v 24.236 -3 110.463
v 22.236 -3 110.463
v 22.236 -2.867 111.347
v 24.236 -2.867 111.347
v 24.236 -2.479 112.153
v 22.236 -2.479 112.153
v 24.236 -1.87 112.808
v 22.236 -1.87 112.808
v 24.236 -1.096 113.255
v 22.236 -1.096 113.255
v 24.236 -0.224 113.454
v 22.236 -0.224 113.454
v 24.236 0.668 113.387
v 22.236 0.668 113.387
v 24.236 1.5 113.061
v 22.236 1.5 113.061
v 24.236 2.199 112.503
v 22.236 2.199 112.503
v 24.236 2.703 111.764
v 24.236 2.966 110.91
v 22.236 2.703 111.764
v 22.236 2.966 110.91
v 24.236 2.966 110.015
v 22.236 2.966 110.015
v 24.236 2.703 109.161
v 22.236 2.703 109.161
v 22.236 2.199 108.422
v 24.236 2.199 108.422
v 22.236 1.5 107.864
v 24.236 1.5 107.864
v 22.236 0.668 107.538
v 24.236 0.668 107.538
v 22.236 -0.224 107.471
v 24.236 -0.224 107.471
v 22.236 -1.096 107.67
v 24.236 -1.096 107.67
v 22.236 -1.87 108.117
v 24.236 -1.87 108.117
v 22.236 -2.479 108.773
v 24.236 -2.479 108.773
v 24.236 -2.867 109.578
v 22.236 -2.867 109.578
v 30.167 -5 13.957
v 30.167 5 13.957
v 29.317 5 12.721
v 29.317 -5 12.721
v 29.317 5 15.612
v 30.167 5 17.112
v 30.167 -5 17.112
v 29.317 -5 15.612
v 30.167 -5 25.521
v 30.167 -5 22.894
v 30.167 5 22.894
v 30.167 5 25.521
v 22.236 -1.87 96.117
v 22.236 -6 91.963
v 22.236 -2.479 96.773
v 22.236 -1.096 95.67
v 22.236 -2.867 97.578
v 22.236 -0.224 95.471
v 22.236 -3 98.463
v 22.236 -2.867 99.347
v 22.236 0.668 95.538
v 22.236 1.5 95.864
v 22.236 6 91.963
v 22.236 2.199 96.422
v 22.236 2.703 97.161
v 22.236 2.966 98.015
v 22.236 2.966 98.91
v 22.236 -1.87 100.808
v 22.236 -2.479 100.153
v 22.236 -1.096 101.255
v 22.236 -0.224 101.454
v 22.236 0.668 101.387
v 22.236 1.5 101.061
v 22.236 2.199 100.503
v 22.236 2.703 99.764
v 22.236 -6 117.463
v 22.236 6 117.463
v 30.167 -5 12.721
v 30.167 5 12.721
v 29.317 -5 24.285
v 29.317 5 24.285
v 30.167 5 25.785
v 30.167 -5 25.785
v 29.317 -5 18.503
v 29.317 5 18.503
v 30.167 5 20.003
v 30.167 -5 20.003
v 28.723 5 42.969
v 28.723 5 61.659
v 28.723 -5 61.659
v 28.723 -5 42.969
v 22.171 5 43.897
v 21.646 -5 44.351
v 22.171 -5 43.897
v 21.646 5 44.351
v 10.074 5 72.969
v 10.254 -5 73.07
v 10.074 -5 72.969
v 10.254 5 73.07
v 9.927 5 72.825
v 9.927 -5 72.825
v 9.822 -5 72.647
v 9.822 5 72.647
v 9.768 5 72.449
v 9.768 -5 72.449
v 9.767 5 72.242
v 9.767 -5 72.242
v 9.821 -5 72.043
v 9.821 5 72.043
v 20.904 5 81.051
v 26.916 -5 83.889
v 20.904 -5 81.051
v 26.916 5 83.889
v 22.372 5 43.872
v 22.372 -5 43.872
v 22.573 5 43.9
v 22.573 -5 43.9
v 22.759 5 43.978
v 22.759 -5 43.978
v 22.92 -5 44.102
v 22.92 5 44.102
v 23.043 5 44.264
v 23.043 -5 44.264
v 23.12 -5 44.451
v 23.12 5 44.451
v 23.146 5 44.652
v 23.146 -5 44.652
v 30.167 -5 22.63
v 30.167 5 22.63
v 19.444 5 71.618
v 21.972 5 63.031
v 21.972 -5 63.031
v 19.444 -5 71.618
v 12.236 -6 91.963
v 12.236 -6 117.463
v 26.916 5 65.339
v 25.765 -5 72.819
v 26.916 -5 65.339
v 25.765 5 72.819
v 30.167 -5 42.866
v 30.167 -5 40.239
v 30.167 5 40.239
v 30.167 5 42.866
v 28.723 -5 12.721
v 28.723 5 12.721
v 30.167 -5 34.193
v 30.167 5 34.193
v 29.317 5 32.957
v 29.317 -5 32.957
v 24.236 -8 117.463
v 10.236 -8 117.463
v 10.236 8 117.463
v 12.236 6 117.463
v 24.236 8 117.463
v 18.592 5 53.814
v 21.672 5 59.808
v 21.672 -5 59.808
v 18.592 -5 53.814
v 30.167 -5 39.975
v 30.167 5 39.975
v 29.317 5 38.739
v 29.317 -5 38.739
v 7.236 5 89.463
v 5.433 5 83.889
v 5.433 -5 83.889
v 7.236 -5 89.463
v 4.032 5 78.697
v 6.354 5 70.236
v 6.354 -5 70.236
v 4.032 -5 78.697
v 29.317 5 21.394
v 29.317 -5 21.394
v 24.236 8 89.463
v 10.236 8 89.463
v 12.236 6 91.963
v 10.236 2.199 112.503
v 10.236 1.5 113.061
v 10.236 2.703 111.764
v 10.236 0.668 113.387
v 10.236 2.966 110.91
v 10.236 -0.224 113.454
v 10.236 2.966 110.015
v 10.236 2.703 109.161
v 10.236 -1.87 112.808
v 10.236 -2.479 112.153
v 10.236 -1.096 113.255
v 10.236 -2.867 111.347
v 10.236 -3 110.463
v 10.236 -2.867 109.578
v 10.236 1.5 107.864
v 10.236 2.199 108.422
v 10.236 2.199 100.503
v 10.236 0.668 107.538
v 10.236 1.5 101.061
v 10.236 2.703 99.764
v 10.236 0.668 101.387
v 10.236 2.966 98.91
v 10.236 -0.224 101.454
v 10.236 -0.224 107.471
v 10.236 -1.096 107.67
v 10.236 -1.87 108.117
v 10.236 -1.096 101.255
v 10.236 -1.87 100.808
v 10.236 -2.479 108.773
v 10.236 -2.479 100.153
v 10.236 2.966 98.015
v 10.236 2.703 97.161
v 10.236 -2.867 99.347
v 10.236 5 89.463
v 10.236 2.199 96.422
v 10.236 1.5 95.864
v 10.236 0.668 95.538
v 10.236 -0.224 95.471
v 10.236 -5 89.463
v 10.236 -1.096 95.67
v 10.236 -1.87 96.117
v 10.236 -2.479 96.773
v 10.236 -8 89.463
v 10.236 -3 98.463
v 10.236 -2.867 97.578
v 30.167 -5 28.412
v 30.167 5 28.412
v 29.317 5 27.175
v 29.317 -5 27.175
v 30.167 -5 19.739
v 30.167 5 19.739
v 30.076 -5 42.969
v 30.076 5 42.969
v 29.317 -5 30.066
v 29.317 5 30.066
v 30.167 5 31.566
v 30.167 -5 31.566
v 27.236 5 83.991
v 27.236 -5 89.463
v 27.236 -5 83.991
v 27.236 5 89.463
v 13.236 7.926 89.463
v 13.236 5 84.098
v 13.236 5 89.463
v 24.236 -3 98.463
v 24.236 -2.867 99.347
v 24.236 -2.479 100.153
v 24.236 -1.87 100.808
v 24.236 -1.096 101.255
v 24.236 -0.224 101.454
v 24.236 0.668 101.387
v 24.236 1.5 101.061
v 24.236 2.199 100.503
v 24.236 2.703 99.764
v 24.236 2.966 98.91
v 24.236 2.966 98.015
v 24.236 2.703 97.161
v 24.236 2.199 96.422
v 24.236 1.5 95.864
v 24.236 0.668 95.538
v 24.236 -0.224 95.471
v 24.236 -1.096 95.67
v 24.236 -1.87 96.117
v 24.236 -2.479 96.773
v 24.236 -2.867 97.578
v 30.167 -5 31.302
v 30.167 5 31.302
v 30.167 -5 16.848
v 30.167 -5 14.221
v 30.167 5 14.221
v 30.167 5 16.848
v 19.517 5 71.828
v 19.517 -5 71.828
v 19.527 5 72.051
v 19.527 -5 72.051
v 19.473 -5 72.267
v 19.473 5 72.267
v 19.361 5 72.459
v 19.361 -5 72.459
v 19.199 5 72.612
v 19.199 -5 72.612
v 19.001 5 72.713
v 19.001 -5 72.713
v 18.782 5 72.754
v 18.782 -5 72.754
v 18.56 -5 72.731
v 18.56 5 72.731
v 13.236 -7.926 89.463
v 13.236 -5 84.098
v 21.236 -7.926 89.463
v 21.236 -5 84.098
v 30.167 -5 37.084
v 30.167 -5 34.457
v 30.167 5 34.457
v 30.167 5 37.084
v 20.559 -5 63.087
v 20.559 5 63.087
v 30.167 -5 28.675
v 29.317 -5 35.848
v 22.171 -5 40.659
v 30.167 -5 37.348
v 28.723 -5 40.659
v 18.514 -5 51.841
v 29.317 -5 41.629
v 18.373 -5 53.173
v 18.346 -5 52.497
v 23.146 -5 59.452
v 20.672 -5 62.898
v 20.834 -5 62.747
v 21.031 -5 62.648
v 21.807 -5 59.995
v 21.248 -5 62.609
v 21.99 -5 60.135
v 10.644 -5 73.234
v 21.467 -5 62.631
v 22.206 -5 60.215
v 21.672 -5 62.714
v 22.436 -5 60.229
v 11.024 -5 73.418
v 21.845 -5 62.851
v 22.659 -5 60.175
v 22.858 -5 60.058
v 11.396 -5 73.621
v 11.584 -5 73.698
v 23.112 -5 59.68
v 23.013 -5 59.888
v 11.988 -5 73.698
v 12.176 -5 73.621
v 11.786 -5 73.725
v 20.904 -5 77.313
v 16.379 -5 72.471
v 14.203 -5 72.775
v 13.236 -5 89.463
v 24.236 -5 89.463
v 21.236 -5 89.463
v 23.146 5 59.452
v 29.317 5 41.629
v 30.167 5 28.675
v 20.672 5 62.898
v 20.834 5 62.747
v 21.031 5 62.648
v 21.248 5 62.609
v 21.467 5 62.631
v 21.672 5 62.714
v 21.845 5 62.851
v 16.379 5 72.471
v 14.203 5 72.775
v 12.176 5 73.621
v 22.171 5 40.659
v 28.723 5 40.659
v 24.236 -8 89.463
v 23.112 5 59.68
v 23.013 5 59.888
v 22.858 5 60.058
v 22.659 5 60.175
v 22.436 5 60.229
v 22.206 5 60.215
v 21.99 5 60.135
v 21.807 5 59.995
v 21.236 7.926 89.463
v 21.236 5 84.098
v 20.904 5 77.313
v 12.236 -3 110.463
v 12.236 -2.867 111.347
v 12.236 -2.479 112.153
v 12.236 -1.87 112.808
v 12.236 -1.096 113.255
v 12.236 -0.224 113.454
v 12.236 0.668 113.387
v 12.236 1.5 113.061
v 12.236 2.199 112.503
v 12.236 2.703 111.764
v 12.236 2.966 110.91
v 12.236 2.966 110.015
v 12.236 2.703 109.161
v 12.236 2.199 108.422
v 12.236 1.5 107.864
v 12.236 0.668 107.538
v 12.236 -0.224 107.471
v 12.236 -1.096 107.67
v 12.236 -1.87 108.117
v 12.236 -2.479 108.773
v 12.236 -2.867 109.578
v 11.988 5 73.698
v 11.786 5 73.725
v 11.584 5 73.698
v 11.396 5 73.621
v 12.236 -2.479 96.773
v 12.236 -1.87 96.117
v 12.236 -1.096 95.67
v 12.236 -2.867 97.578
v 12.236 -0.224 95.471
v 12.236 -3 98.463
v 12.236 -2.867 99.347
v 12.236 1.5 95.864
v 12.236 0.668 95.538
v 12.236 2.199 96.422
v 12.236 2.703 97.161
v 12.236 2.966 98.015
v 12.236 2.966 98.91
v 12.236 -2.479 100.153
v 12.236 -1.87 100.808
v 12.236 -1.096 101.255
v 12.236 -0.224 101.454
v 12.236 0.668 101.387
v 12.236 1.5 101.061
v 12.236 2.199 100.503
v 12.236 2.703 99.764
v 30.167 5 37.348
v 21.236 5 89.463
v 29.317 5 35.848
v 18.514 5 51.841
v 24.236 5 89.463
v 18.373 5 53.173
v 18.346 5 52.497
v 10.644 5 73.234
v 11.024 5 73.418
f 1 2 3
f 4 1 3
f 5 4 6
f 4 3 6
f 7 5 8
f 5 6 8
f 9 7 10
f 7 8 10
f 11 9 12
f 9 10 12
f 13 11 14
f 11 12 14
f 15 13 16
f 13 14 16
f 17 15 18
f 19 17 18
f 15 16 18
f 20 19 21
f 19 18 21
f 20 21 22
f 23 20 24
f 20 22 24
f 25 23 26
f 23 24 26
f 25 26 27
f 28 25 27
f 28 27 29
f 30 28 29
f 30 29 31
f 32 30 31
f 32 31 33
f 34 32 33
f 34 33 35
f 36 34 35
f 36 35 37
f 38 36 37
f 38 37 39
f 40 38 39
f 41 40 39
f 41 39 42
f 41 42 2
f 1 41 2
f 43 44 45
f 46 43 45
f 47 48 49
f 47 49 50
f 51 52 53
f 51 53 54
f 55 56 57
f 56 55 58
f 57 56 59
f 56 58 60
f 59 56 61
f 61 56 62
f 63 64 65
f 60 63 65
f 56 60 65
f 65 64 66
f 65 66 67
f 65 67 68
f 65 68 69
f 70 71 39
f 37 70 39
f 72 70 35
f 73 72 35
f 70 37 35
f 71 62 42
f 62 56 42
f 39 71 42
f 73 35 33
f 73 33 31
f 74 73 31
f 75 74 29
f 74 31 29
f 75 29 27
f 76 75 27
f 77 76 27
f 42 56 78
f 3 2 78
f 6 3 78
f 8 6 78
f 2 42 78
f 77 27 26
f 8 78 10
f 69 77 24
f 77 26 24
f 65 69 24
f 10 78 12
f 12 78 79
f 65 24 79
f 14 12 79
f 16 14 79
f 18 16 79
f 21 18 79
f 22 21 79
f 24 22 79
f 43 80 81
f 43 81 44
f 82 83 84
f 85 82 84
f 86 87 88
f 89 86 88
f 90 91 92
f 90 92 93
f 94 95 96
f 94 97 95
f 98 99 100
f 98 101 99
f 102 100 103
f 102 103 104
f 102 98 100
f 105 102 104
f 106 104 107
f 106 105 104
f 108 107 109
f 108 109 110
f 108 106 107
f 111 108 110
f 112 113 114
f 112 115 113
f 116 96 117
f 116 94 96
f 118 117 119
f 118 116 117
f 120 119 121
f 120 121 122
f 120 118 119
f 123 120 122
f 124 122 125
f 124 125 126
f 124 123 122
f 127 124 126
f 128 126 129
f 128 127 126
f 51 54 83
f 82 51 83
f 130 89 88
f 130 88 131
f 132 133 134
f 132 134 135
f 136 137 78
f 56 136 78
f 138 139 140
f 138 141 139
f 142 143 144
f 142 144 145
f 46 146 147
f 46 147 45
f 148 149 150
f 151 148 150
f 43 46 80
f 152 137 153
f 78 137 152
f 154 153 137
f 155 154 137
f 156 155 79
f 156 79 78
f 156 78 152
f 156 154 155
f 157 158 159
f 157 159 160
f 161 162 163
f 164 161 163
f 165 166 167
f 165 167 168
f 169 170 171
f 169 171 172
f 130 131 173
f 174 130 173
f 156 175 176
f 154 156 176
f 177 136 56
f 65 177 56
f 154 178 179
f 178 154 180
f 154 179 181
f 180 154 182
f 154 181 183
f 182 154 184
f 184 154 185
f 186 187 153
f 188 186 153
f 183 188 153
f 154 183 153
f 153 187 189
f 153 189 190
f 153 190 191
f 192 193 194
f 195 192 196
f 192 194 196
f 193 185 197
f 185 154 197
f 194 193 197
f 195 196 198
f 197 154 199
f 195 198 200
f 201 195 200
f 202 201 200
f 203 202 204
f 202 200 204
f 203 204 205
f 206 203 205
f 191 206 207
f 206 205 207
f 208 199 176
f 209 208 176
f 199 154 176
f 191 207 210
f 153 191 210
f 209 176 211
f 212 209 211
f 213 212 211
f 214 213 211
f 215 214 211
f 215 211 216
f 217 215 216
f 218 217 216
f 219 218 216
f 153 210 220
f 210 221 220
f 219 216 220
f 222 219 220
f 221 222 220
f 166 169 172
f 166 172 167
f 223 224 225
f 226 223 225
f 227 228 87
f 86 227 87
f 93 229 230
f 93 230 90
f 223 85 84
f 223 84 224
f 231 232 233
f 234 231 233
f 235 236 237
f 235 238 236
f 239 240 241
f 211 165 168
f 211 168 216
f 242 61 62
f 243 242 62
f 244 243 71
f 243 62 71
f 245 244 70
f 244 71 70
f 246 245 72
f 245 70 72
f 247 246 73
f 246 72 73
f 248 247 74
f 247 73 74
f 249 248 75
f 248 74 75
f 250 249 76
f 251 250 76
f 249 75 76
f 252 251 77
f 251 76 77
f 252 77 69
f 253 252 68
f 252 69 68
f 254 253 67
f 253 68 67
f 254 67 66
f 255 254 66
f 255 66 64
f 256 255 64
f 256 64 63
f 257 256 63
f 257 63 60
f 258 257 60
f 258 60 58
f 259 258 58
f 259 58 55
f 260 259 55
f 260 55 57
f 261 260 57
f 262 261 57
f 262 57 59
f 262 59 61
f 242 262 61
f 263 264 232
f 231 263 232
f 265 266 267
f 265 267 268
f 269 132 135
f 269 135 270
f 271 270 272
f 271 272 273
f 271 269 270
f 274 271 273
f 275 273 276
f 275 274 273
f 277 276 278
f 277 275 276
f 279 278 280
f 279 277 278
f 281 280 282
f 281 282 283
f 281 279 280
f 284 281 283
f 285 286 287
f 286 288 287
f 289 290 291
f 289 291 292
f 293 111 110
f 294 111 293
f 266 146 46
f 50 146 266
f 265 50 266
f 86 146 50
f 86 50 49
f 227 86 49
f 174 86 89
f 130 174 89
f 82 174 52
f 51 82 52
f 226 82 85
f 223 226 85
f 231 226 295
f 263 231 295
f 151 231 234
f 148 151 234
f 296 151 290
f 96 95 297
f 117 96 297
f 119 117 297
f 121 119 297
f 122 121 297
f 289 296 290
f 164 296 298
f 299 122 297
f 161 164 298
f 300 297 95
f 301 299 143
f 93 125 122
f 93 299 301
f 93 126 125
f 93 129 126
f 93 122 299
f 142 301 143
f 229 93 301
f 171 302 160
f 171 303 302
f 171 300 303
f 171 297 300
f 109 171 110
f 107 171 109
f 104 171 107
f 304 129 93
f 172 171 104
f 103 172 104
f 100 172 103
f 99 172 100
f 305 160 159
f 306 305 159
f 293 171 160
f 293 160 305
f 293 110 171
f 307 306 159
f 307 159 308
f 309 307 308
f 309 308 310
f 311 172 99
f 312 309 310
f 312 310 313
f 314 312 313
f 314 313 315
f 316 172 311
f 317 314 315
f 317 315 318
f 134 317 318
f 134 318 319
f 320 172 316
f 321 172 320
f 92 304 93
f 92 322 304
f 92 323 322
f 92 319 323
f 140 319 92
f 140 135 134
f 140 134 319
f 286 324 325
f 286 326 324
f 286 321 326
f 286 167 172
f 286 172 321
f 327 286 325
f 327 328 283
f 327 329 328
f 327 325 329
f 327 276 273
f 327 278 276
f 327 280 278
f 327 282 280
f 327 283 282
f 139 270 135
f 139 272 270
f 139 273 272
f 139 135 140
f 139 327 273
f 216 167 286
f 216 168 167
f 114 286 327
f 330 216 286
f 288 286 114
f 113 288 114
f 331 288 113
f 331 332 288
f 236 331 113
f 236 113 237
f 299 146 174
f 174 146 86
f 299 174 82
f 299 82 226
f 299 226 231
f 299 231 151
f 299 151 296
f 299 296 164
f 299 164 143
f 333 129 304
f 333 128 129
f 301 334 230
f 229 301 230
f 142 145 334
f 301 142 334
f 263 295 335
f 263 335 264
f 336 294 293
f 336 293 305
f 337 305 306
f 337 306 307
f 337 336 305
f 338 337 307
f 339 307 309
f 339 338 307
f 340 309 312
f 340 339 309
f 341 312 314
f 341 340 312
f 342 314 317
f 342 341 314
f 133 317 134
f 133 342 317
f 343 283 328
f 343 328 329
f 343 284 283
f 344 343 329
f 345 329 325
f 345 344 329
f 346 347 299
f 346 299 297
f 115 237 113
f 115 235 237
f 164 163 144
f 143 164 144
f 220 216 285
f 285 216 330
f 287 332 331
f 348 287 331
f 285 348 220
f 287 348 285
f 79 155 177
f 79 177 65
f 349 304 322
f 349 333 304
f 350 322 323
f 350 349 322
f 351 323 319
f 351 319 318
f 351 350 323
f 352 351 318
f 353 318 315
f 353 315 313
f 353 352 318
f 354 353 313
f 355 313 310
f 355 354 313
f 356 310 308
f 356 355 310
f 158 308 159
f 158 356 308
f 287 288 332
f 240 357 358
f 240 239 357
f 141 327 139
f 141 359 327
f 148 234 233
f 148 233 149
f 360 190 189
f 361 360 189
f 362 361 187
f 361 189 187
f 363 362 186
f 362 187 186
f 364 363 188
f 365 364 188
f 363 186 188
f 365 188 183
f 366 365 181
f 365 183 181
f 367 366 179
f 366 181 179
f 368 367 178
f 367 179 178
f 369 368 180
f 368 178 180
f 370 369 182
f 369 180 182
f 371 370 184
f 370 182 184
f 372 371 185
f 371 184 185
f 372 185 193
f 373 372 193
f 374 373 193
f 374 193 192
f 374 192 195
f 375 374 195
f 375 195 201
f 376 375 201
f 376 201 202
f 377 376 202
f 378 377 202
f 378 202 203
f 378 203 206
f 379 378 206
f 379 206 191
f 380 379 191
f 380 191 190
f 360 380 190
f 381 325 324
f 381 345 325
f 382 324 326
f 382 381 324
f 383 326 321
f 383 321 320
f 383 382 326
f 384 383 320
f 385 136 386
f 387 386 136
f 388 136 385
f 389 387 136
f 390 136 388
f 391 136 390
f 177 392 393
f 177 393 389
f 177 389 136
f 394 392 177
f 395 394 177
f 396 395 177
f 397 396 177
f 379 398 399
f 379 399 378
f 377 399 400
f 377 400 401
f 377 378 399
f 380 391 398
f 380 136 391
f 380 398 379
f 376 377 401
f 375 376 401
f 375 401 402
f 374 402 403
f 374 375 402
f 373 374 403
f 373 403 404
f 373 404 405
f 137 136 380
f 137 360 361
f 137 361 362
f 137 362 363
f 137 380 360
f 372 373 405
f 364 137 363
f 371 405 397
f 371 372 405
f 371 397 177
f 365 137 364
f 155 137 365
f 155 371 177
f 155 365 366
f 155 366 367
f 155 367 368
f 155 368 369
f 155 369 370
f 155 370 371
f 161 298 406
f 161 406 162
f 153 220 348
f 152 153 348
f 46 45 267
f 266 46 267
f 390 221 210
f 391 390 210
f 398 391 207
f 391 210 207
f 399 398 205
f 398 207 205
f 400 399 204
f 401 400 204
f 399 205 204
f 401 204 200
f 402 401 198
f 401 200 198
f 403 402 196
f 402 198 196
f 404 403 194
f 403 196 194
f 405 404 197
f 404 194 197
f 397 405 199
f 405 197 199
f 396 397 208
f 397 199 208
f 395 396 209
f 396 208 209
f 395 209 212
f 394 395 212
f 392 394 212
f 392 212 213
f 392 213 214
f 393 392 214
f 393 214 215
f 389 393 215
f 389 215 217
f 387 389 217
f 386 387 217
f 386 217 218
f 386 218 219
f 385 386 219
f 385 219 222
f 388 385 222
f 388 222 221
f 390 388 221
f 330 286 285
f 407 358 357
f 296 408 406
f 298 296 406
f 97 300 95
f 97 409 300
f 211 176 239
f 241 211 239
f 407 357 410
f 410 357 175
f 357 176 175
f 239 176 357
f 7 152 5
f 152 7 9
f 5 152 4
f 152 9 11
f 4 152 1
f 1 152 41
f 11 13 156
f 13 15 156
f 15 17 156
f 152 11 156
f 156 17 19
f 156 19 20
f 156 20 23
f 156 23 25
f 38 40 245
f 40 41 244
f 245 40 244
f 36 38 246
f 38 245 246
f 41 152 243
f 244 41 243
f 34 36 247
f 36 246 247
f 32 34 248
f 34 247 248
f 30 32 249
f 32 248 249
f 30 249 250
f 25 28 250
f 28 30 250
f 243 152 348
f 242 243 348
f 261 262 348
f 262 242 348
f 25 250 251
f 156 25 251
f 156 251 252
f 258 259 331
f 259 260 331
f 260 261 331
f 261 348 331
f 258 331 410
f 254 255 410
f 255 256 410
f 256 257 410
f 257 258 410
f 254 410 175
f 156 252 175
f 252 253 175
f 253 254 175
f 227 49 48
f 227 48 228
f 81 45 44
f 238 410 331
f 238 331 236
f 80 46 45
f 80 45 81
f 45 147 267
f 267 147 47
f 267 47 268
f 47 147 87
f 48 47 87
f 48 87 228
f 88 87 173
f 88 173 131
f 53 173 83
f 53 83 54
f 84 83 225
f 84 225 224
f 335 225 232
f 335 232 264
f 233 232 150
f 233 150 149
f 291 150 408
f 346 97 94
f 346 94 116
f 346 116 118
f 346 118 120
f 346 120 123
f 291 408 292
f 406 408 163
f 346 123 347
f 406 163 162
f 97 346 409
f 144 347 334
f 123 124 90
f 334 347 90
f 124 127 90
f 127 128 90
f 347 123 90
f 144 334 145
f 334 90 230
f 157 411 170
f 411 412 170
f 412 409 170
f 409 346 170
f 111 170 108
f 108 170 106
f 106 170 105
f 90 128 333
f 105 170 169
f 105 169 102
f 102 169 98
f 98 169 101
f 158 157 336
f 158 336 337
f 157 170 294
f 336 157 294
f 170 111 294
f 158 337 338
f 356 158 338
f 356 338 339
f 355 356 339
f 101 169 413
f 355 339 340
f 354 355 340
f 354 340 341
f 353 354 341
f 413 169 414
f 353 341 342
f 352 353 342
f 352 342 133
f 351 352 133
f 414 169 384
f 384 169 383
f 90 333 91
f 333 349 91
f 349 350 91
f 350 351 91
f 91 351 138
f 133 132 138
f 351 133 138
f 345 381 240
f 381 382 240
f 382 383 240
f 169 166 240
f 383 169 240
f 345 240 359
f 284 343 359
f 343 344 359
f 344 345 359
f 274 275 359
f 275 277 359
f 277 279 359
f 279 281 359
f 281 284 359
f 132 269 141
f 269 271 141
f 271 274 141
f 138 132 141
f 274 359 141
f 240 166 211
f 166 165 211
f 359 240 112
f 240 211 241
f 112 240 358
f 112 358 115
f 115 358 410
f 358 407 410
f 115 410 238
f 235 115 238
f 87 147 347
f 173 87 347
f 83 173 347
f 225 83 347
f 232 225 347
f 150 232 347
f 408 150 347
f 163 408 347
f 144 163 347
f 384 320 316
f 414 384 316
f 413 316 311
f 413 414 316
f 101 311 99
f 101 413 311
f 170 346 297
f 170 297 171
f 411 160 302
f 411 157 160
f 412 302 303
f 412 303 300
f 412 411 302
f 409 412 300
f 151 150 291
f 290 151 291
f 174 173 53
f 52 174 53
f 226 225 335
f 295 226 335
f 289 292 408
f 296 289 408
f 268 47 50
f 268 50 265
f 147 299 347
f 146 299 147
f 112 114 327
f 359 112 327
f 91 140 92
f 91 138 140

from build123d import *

# Parameters (mm, degrees)
SALIENTE_EXTRUIR1_DEPTH = 5
SALIENTE_EXTRUIR2_DEPTH = 10
CUT_EXTRUDE1_DEPTH      = 95.93998922245981
BOSS_EXTRUDE2_DEPTH     = 28
SKETCH9_W               = 10.000000000000002
SKETCH9_H               = 12
CUT_EXTRUDE5_DEPTH      = 25.5
BOSS_EXTRUDE4_DEPTH     = 4
SKETCH8_R               = 2.999999999999989
CUT_EXTRUDE6_DEPTH      = 30


with BuildPart() as part:
    # Croquis1 → Saliente-Extruir1 (new, symmetric)
    with BuildSketch(Plane(origin=(0, 0, 0), x_dir=(1, 0, 0), z_dir=(0, 1, 0))):
        Polygon((26.915963098267575, -65.33925873527804), (28.72327045931731, -61.65948350871261), (28.72327045931731, -40.659483508712604), (22.170681671405973, -40.659483508712604), (6.35406798016902, -70.23576145650345), (4.0317775841889825, -78.69685690697727), (5.433122947121303, -83.88896685505465), (7.2356662280183635, -89.46256866352141), (27.235666228018367, -89.46256866352135), (27.235666228018367, -83.99084385179745), (26.915963098267575, -83.88896685505465), (20.90447714075739, -81.05101682856319), (20.90447714075739, -77.31259376727242), (25.764663289477145, -72.8187400941099), align=None)
        with BuildLine():
            Line((9.821066256588082, -72.04316428414087), (20.5589333036859, -63.08706400458823))
            ThreePointArc((20.5589333036859, -63.08706400458823), (20.767764666496063, -62.79849907988661), (21.083118079778938, -62.6328715501941))
            ThreePointArc((21.083118079778938, -62.6328715501941), (21.597621770602938, -62.67624114259194), (21.972309386725804, -63.031493390636115))
            Line((21.9723093867258, -63.031493390636115), (19.44429254500012, -71.61767013188037))
            ThreePointArc((19.44429254500012, -71.61767013188037), (19.502654350523237, -72.1808265025535), (19.16473943472284, -72.63510032730379))
            ThreePointArc((19.16473943472284, -72.63510032730379), (18.905879524091997, -72.73854256608807), (18.62717721828115, -72.74435417793264))
            ThreePointArc((18.62717721828115, -72.74435417793264), (18.593500542050098, -72.73819972124883), (18.560126358304874, -72.73057346932643))
            ThreePointArc((18.560126358304874, -72.73057346932643), (15.281159258646955, -72.55317807186373), (12.175699872191544, -73.62051886409272))
            ThreePointArc((12.175699872191544, -73.62051886409272), (11.987578727371515, -73.69844119364632), (11.785699872191557, -73.72501904914084))
            ThreePointArc((11.785699872191557, -73.72501904914084), (11.583821017011589, -73.69844119364633), (11.395699872191557, -73.62051886409272))
            ThreePointArc((11.395699872191557, -73.62051886409272), (10.835248951640853, -73.32399517310118), (10.254430336713742, -73.06967004610912))
            ThreePointArc((10.254430336713742, -73.06967004610912), (10.011115132081741, -72.9167732340473), (9.839678957283844, -72.68614504428194))
            ThreePointArc((9.839678957283844, -72.68614504428194), (9.76100515957486, -72.36666268002743), (9.821066256588082, -72.04316428414087))
        make_face(mode=Mode.SUBTRACT)
        with BuildLine():
            Line((21.672345420619333, -59.808429563113535), (18.5917806510747, -53.81351265341419))
            ThreePointArc((18.5917806510747, -53.81351265341419), (18.51589589891999, -53.65076212808047), (18.452714922493957, -53.48267169609864))
            ThreePointArc((18.452714922493957, -53.48267169609864), (18.334713754625824, -52.65637444161208), (18.514235075155533, -51.84122812108702))
            Line((18.514235075155533, -51.84122812108702), (21.64649689531295, -44.35103681201493))
            Line((21.64649689531295, -44.35103681201493), (22.170681671405973, -43.89684435762081))
            ThreePointArc((22.170681671405973, -43.89684435762081), (22.519573206251422, -43.88721151653816), (22.837737106462836, -44.03070307488359))
            ThreePointArc((22.837737106462836, -44.03070307488359), (23.06477570342122, -44.30517298097964), (23.146109199486098, -44.65196559376006))
            Line((23.146109199486098, -44.65196559376006), (23.146109199486098, -59.45193016741627))
            ThreePointArc((23.146109199486098, -59.45193016741627), (23.06477570342123, -59.7987227801967), (22.837737106462843, -60.07319268629275))
            ThreePointArc((22.837737106462843, -60.07319268629275), (22.19330594649592, -60.21254770320941), (21.672345420619333, -59.808429563113535))
        make_face(mode=Mode.SUBTRACT)
    extrude(amount=SALIENTE_EXTRUIR1_DEPTH, both=True)

    # Croquis2 → Saliente-Extruir2 (add)
    with BuildSketch(Plane.XZ.offset(5)):
        Polygon((30.16704098325694, 42.969154574791474), (28.723270459317312, 42.969154574791474), (28.723270459317316, 12.721213466502482), (30.16704098325694, 12.721213466502482), align=None)
    extrude(amount=-SALIENTE_EXTRUIR2_DEPTH)

    # Sketch2 → Cut-Extrude1 (cut, through all)
    with BuildSketch(Plane(origin=(0, 5, 0), x_dir=(1, 0, 0), z_dir=(0, 1, 0))):
        Polygon((30.16704098325694, -13.957420664168177), (29.31745769455622, -12.721213466502482), (30.16704098325694, -14.22121346650248), align=None)
        Polygon((30.16704098325694, -16.848244602946536), (30.16704098325694, -17.11203740528084), (29.31745769455622, -15.61203740528084), align=None)
        Polygon((29.31745769455622, -18.502861344059202), (30.16704098325694, -20.002861344059202), (30.16704098325694, -19.739068541724897), align=None)
        Polygon((29.31745769455622, -21.393685282837563), (30.16704098325694, -22.893685282837563), (30.16704098325694, -22.62989248050326), align=None)
        Polygon((29.31745769455622, -24.284509221615924), (30.16704098325694, -25.78450922161592), (30.16704098325694, -25.520716419281616), align=None)
        Polygon((29.31745769455622, -27.17533316039428), (30.16704098325694, -28.675333160394278), (30.16704098325694, -28.411540358059977), align=None)
        Polygon((29.31745769455622, -30.066157099172642), (30.16704098325694, -31.56615709917264), (30.16704098325694, -31.302364296838338), align=None)
        Polygon((29.31745769455622, -32.956981037951), (30.16704098325694, -34.456981037951), (30.16704098325694, -34.193188235616695), align=None)
        Polygon((29.31745769455622, -35.847804976729364), (30.16704098325694, -37.347804976729364), (30.16704098325694, -37.084012174395056), align=None)
        Polygon((29.31745769455622, -38.738628915507725), (30.16704098325694, -40.238628915507725), (30.16704098325694, -39.97483611317342), align=None)
        Polygon((29.31745769455622, -41.629452854286086), (30.16704098325694, -43.12945285428608), (30.16704098325694, -42.86566005195178), align=None)
        Polygon((29.31745769455622, -44.52027679306445), (30.16704098325694, -46.02027679306444), (30.16704098325694, -45.75648399073014), align=None)
        Polygon((29.31745769455622, -47.41110073184281), (30.16704098325694, -48.9111007318428), (30.16704098325694, -48.6473079295085), align=None)
        Polygon((29.31745769455622, -50.30192467062117), (30.16704098325694, -51.80192467062116), (30.16704098325694, -51.53813186828686), align=None)
        Polygon((29.31745769455622, -53.192748609399516), (30.16704098325694, -54.692748609399516), (30.16704098325694, -54.428955807065215), align=None)
    extrude(amount=-CUT_EXTRUDE1_DEPTH, mode=Mode.SUBTRACT)


with BuildPart() as cut_extrude1_piece_1:
    # of the separate pieces the step leaves, piece 1, a body of its own (cut_extrude1_pieces)
    add(part.part.solids().sort_by_distance((26.915963098, -5, 65.339258735))[0])

    # Sketch7 → Boss-Extrude2 (add)
    with BuildSketch(Plane.XY.offset(89.46256866352142)):
        Polygon((10.235666228018118, 7.9999999999999964), (10.23566622801812, -8.000000000000004), (24.23566622801812, -8.000000000000004), (24.23566622801812, 7.9999999999999964), align=None)
    extrude(amount=BOSS_EXTRUDE2_DEPTH)

    # Sketch9 → Cut-Extrude5 (cut)
    with BuildSketch(Plane.XY.offset(117.46256866352142)):
        with Locations((17.23566622801837, 0)):
            Rectangle(SKETCH9_W, SKETCH9_H)
    extrude(amount=-CUT_EXTRUDE5_DEPTH, mode=Mode.SUBTRACT)

    # Sketch10 → Boss-Extrude4 (add, symmetric)
    with BuildSketch(Plane(origin=(17.235666228018367, 0, 0), x_dir=(0, 0, -1), z_dir=(1, 3.5e-16, 0))):
        Polygon((-84.0979108440365, 5.000000000000003), (-89.46256866352141, 5.0000000000000036), (-89.46256866352141, 7.925681422350478), align=None)
        Polygon((-89.46256866352141, -5.0000000000000036), (-84.0979108440365, -5.000000000000003), (-89.46256866352141, -7.925681422350478), align=None)
    extrude(amount=BOSS_EXTRUDE4_DEPTH, both=True)

    # Sketch8 → Cut-Extrude6 (cut)
    with BuildSketch(Plane.ZY.offset(-10.235666228018367)):
        with Locations(Location((98.46256866352141, -3.045e-14, 0), (0, 0, 270))):
            Circle(SKETCH8_R)
        with Locations(Location((110.46256866352141, -2.605e-14, 0), (0, 0, 270))):
            Circle(SKETCH8_R)
    extrude(amount=-CUT_EXTRUDE6_DEPTH, mode=Mode.SUBTRACT)


with BuildPart() as cut_extrude1_piece_2:
    # of the separate pieces the step leaves, piece 2, a body of its own (cut_extrude1_pieces)
    add(part.part.solids().sort_by_distance((30.167040983, -5, 12.721213467))[0])


solid = Compound([cut_extrude1_piece_1.part, cut_extrude1_piece_2.part])
